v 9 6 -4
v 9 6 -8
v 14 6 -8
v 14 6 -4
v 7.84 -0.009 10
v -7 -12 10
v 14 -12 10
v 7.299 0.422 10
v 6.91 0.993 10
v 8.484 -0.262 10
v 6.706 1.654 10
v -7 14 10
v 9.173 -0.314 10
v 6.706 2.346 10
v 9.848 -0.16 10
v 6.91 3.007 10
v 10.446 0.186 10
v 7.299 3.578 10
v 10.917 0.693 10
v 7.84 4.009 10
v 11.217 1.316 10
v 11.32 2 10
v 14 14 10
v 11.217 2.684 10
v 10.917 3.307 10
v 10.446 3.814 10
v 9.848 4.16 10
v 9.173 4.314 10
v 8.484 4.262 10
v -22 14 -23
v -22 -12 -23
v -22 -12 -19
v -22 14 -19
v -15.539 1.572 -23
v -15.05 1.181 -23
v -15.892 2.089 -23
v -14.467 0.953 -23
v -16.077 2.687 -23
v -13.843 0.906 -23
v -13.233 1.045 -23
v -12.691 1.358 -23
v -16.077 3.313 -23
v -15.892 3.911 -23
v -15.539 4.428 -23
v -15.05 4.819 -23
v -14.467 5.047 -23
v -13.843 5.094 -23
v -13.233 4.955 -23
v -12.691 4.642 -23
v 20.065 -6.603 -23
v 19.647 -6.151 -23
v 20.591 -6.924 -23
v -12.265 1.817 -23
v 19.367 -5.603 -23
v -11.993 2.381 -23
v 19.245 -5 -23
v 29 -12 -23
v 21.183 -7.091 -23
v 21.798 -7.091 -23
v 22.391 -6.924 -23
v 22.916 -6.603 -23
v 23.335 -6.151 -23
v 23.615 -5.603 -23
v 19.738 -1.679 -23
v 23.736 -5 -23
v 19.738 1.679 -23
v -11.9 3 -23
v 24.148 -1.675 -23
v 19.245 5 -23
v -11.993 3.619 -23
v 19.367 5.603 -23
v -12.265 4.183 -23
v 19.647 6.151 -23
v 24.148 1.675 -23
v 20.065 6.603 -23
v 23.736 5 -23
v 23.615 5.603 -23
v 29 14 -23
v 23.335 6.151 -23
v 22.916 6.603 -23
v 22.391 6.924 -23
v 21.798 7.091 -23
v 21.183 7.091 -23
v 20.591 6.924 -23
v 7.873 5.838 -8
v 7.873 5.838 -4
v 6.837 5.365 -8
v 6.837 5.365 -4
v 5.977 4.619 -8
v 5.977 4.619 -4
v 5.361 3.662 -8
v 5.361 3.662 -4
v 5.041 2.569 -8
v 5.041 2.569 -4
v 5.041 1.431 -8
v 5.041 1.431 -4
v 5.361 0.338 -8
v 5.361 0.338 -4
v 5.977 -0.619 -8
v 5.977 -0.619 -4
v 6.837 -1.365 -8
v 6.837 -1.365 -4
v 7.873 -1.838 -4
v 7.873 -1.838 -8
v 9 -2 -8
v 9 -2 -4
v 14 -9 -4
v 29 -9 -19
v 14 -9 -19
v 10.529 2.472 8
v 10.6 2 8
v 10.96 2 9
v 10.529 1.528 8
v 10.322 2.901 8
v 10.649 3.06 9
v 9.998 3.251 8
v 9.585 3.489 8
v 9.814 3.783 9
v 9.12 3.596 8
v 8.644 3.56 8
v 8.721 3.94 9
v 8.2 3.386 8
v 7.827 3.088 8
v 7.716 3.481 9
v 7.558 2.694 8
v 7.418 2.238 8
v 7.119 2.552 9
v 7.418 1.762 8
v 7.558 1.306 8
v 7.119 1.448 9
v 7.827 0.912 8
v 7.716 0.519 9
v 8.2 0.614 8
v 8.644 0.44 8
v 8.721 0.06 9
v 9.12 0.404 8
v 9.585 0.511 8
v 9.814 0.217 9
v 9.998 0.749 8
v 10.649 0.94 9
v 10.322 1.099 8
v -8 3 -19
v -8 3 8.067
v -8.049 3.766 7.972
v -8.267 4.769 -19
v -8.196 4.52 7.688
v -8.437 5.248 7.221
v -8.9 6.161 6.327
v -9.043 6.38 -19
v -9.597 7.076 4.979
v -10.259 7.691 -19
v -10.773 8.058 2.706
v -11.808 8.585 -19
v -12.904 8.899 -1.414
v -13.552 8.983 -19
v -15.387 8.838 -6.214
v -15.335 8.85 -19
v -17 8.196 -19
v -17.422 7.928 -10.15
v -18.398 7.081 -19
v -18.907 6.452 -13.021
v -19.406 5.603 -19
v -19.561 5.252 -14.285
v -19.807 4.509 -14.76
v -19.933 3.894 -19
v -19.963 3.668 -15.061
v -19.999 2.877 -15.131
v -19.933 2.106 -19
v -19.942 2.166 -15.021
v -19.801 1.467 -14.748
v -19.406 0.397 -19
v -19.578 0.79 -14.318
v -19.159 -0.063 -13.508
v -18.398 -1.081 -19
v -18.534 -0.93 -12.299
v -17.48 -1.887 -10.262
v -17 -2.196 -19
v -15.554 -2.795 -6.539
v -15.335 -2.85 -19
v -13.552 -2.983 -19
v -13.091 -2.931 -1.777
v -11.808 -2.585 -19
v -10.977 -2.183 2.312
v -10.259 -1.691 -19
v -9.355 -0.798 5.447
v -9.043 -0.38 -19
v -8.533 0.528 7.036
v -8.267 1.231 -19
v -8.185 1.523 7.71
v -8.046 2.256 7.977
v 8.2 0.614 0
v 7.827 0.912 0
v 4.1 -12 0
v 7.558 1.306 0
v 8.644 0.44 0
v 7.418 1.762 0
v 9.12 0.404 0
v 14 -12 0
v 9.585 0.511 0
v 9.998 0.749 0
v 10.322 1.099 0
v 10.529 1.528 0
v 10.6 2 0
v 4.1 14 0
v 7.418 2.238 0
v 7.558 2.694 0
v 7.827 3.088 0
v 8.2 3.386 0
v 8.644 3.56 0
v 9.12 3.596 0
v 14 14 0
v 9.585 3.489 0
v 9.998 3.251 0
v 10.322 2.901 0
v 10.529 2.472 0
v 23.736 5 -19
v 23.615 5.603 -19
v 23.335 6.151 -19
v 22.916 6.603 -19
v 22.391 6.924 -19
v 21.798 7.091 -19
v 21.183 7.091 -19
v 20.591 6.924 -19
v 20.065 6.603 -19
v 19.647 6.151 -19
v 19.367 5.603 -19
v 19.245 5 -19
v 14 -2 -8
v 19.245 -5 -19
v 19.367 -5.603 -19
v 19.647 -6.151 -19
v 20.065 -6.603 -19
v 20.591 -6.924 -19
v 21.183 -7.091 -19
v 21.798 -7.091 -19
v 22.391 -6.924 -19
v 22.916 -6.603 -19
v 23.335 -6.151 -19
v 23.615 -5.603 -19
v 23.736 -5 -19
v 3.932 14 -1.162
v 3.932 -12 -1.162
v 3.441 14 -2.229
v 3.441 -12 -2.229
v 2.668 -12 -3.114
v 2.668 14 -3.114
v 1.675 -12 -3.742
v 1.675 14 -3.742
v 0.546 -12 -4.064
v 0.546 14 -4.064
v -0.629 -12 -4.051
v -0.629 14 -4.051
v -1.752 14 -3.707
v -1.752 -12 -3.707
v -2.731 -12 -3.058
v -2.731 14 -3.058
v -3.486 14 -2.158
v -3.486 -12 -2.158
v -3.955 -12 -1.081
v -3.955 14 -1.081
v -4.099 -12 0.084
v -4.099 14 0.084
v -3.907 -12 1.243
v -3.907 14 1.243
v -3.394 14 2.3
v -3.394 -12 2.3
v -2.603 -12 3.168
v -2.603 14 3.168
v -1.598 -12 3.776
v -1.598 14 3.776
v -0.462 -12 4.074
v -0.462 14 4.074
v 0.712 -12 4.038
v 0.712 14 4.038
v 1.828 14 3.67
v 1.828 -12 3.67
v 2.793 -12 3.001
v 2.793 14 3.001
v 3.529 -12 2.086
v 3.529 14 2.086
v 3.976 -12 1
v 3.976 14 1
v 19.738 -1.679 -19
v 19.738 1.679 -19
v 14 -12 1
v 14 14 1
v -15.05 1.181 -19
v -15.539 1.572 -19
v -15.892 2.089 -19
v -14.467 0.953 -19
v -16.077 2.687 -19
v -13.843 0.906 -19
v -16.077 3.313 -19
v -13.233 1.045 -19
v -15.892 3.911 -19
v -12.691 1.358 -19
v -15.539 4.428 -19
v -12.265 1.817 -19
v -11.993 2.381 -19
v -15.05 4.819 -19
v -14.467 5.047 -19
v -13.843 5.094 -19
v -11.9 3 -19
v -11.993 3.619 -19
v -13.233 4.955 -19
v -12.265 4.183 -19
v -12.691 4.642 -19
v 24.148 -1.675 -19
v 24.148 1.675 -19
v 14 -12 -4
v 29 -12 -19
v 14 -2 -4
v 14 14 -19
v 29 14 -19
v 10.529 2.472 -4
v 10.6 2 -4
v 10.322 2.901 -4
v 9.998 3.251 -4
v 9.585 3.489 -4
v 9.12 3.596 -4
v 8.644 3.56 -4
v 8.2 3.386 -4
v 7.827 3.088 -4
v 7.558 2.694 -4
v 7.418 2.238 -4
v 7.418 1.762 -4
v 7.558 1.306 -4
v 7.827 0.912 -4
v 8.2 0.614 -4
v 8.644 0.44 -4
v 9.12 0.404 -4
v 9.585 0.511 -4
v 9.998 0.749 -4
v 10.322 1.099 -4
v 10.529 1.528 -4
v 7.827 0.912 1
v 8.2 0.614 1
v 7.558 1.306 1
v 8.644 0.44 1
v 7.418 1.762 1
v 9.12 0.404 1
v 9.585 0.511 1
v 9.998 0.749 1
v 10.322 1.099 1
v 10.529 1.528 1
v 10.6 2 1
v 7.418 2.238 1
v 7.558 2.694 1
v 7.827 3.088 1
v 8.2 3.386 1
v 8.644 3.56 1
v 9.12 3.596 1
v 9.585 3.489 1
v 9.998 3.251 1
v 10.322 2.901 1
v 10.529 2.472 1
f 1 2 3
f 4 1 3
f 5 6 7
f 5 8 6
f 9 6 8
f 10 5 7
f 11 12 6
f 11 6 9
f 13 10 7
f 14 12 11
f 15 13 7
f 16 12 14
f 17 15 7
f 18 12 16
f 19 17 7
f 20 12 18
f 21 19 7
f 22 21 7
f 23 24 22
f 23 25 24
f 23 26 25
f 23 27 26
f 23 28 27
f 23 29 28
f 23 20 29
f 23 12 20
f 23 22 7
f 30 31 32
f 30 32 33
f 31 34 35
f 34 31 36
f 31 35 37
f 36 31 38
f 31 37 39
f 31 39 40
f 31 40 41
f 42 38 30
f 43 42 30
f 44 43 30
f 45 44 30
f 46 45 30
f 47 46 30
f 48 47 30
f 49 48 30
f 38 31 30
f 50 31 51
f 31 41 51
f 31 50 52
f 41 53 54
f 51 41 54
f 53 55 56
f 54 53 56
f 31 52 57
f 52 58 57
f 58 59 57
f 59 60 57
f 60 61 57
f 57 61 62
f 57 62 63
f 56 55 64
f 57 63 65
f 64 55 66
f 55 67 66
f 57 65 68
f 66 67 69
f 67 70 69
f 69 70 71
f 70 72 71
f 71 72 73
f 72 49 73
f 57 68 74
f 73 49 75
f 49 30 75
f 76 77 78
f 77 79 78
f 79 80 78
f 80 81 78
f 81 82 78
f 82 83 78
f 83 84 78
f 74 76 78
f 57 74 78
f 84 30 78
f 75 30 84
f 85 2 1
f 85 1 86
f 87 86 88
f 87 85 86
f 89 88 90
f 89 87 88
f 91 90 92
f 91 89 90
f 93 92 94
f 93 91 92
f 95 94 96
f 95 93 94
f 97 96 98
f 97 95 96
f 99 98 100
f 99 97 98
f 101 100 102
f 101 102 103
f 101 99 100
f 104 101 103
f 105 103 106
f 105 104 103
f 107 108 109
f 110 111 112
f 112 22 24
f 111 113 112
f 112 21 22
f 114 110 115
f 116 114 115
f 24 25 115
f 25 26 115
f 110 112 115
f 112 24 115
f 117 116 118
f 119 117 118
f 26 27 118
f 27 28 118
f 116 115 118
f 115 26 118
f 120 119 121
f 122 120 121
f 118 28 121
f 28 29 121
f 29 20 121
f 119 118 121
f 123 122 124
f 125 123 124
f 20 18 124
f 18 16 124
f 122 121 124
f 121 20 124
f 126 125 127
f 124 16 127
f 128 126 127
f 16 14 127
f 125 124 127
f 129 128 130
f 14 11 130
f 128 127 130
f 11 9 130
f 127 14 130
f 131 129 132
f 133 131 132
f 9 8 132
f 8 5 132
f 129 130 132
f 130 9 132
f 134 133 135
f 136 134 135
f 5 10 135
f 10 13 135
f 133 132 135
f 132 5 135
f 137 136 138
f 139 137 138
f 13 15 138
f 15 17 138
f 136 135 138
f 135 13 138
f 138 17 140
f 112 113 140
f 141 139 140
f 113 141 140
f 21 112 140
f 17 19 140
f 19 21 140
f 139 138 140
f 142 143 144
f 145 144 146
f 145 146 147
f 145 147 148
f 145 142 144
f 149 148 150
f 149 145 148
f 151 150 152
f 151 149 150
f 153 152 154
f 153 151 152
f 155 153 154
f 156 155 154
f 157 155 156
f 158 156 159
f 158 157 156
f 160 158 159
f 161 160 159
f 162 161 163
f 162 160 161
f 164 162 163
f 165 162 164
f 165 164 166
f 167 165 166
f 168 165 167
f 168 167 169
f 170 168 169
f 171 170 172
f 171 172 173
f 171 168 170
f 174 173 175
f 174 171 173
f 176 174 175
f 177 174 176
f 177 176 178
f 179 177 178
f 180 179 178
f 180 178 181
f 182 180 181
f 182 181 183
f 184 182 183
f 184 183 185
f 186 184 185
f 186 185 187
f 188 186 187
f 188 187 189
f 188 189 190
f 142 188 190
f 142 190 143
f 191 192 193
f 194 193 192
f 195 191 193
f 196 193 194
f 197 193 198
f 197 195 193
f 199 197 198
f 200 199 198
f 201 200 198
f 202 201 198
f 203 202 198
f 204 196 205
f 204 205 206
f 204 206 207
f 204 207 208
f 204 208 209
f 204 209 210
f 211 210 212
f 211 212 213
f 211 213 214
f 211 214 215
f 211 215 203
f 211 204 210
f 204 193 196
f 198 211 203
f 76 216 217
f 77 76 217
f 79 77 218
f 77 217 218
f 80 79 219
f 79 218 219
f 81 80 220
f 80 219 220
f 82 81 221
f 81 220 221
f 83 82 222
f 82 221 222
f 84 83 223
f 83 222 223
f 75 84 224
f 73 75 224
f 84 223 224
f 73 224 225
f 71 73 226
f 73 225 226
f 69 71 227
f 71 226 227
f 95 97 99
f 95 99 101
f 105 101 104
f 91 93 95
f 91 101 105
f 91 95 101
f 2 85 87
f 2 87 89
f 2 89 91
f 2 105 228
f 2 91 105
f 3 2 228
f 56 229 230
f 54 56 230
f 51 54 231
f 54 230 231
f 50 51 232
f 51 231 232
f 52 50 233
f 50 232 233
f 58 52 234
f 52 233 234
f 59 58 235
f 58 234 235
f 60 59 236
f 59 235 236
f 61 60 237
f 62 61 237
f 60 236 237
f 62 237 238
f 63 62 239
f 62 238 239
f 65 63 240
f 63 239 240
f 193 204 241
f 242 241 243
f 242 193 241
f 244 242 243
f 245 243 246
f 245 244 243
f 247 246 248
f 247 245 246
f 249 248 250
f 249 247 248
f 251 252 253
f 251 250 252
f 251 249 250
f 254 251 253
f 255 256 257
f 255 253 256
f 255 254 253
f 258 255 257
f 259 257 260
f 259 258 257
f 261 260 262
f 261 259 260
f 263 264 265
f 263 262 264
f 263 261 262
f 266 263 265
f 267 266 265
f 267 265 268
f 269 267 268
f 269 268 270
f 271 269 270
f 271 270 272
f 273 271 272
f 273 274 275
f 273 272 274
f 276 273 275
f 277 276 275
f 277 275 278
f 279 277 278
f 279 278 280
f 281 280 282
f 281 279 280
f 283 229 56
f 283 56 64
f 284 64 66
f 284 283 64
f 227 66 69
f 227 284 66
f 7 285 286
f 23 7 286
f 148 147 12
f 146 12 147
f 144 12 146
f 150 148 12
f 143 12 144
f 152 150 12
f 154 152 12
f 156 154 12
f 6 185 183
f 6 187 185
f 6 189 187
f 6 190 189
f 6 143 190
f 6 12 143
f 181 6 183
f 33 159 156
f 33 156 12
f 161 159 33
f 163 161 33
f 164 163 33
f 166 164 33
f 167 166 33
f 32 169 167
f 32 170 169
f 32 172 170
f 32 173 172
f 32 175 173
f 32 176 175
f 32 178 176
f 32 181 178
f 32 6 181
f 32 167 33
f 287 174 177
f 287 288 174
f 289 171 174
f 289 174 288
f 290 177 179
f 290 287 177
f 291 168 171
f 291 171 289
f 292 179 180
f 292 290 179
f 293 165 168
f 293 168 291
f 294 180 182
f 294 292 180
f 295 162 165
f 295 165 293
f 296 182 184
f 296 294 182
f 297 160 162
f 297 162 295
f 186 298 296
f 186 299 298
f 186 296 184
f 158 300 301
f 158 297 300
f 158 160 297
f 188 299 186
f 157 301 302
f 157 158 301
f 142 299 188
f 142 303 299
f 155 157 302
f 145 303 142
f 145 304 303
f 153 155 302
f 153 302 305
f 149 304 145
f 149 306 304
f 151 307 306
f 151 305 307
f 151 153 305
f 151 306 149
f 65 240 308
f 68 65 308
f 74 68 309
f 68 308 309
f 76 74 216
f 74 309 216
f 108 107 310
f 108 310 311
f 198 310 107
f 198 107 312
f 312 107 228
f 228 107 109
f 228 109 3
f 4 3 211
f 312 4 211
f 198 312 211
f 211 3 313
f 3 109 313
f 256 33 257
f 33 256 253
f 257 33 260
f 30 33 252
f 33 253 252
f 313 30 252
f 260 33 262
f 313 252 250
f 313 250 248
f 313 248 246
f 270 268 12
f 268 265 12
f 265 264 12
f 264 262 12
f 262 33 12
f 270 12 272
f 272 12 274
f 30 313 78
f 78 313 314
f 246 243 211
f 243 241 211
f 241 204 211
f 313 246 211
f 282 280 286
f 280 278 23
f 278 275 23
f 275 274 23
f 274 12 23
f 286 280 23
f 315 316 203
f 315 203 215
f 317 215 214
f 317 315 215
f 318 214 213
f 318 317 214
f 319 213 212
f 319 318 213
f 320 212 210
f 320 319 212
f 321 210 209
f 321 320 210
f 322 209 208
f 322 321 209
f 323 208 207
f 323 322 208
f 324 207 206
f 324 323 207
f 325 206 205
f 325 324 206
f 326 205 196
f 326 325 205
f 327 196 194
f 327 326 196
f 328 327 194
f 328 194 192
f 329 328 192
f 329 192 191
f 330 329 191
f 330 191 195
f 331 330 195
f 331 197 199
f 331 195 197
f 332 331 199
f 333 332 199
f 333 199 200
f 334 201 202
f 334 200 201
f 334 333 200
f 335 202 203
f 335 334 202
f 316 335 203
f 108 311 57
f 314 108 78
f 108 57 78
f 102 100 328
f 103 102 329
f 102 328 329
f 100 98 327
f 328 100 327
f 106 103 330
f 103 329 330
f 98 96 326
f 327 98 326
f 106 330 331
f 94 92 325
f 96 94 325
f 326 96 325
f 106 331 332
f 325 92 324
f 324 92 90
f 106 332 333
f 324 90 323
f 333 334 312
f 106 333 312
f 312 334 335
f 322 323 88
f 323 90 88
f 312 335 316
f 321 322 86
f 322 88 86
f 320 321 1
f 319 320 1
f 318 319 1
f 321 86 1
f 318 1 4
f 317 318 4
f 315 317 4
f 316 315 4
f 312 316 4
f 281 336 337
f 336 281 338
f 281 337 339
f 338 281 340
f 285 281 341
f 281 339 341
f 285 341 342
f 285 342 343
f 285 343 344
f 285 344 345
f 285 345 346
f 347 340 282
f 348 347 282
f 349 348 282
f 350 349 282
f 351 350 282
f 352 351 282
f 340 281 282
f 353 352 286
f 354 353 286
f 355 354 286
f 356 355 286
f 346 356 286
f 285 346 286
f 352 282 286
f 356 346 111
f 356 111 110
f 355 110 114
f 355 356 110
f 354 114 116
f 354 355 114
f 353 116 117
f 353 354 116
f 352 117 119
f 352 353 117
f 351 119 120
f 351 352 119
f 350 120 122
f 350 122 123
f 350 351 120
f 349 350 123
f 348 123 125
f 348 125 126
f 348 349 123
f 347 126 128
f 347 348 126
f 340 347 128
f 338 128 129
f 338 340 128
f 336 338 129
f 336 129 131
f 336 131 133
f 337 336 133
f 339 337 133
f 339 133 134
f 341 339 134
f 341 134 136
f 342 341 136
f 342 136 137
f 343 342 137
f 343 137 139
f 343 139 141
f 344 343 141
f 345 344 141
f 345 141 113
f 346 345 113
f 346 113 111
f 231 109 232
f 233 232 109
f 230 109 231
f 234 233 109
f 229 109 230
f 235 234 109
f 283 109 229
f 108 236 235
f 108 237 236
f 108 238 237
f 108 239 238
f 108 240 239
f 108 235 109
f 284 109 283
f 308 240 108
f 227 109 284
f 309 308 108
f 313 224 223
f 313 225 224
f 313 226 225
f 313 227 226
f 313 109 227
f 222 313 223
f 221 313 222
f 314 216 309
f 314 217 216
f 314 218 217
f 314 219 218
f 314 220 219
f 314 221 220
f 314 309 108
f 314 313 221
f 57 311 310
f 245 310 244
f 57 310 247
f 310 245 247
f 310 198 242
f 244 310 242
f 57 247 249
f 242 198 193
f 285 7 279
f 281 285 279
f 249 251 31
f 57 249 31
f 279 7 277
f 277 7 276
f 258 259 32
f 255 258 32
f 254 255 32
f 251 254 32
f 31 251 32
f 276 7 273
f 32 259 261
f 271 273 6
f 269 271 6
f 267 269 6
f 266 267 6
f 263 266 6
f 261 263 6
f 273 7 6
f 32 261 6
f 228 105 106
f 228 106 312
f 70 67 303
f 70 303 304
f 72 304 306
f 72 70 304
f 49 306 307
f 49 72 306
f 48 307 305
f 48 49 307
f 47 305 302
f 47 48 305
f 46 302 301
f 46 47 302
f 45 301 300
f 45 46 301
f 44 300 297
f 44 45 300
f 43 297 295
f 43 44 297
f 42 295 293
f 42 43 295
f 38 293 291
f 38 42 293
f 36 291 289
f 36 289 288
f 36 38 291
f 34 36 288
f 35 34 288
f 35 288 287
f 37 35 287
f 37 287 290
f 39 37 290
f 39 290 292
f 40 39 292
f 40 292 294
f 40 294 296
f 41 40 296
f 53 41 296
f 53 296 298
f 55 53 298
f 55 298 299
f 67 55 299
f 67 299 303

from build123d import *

# Parameters (mm, degrees)
CYLINDER072_R              = 6
CYLINDER072_DEPTH          = 30
CYLINDER071_R              = 2.1
CYLINDER071_DEPTH          = 10
CYLINDER074_R              = 1.6
CYLINDER074_DEPTH          = 15
CYLINDER075_R              = 4
CYLINDER075_DEPTH          = 4
BOX025_W                   = 13
BOX025_H                   = 8
BOX025_DEPTH               = 4
EXTRUDE005_DEPTH           = 3
EXTRUDE005_PLACEMENT_ANGLE = 180
EXTRUDE018_DEPTH           = 10
BOX023_W                   = 51
BOX023_H                   = 26
BOX023_DEPTH               = 4
EXTRUDE017_DEPTH           = 26
CYLINDER073_R              = 4.1
CYLINDER073_DEPTH          = 240
BOX024_W                   = 12
BOX024_H                   = 35
BOX024_DEPTH               = 1
BOX022_W                   = 21
BOX022_H                   = 26
BOX022_DEPTH               = 33


with BuildPart() as cylinder072:
    # Cylinder072 → Cylinder072 (new body)
    with BuildSketch(Plane.XY.offset(10)):
        Circle(CYLINDER072_R)
    extrude(amount=CYLINDER072_DEPTH)


with BuildPart() as fusion032:
    # Cylinder071 → Cylinder071 (new body)
    with BuildSketch(Plane.XY):
        Circle(CYLINDER071_R)
    extrude(amount=CYLINDER071_DEPTH)

    # Fusion032: union Cylinder072
    add(cylinder072.part)


with BuildPart() as fusion032_1:
    # Fusion032 placement: moved
    add(fusion032.part.moved(Location((-14, 12, -29))))


with BuildPart() as cylinder074:
    # Cylinder074 → Cylinder074 (new body)
    with BuildSketch(Plane.XY):
        Circle(CYLINDER074_R)
    extrude(amount=CYLINDER074_DEPTH)


with BuildPart() as fusion009:
    # Cone → Cone (revolve)
    with BuildSketch(Plane(origin=(0, 0, 15), x_dir=(1, 0, 0), z_dir=(0, -1, 0))):
        Polygon((0, 0), (1.6, 0), (2.5, 2.5), (0, 2.5), align=None)
    revolve(axis=Axis((0, 0, 15), (0, 0, 1)))

    # Fusion009: union Cylinder074
    add(cylinder074.part)


with BuildPart() as fusion009_1:
    # Fusion009 placement: moved
    add(fusion009.part.moved(Location((9, 11, -7))))


with BuildPart() as cylinder075:
    # Cylinder075 → Cylinder075 (new body)
    with BuildSketch(Plane(origin=(9, 11, -8), x_dir=(1, 0, 0), z_dir=(0, 0, 1))):
        Circle(CYLINDER075_R)
    extrude(amount=CYLINDER075_DEPTH)


with BuildPart() as fusion010:
    # Box025 → Box025 (new body)
    with BuildSketch(Plane(origin=(9, 7, -8), x_dir=(1, 0, 0), z_dir=(0, 0, 1))):
        with Locations((6.5, 4)):
            Rectangle(BOX025_W, BOX025_H)
    extrude(amount=BOX025_DEPTH)

    # Fusion010: union Cylinder075
    add(cylinder075.part)


with BuildPart() as extrude005:
    # Sketch004 → Extrude005 (new body)
    with BuildSketch(Plane.XZ):
        Polygon((-22, -19), (-7, -19), (-7, -4), align=None)
    extrude(amount=-EXTRUDE005_DEPTH)


with BuildPart() as extrude005_1:
    # Extrude005 placement: moved
    add(extrude005.part.moved(Location((7, 0, 0))).rotate(Axis((7, 0, 0), (0, 0, 1)), EXTRUDE005_PLACEMENT_ANGLE))


with BuildPart() as extrude018:
    # Sketch003 → Extrude018 (new body)
    with BuildSketch(Plane.XY):
        with BuildLine():
            ThreePointArc((35.736492, 10), (36.2, 15), (35.736492, 20))
            ThreePointArc((35.736492, 20), (33.490746, 22.111711), (31.244999, 20))
            ThreePointArc((31.244999, 10), (31.8, 15), (31.244999, 20))
            ThreePointArc((31.244999, 10), (33.490746, 7.888289), (35.736492, 10))
        make_face()
    extrude(amount=-EXTRUDE018_DEPTH)


with BuildPart() as extrude018_1:
    # Extrude018 placement: moved
    add(extrude018.part.moved(Location((-12, -3, -17))))


with BuildPart() as cut017:
    # Box023 → Box023 (new body)
    with BuildSketch(Plane(origin=(-22, 0, -23), x_dir=(1, 0, 0), z_dir=(0, 0, 1))):
        with Locations((25.5, 13)):
            Rectangle(BOX023_W, BOX023_H)
    extrude(amount=BOX023_DEPTH)

    # Cut017: cut Extrude018
    add(extrude018_1.part, mode=Mode.SUBTRACT)


with BuildPart() as cut017_1:
    # Cut017 placement: moved
    add(cut017.part.moved(Location((0, -3, 0))))


with BuildPart() as extrude017:
    # Sketch016 → Extrude017 (new body)
    with BuildSketch(Plane.XZ):
        Polygon((-22, -19), (-7, -19), (-7, 10), align=None)
    extrude(amount=-EXTRUDE017_DEPTH)


with BuildPart() as extrude017_1:
    # Extrude017 placement: moved
    add(extrude017.part.moved(Location((0, -3, 0))))


with BuildPart() as cylinder073:
    # Cylinder073 → Cylinder073 (new body)
    with BuildSketch(Plane(origin=(0, -7, 0), x_dir=(1, 0, 0), z_dir=(0, 1, 0))):
        Circle(CYLINDER073_R)
    extrude(amount=CYLINDER073_DEPTH)


with BuildPart() as box024:
    # Box024 → Box024 (new body)
    with BuildSketch(Plane(origin=(3, -6, 0), x_dir=(1, 0, 0), z_dir=(0, 0, 1))):
        with Locations((6, 17.5)):
            Rectangle(BOX024_W, BOX024_H)
    extrude(amount=BOX024_DEPTH)


with BuildPart() as cut022:
    # Box022 → Box022 (new body)
    with BuildSketch(Plane(origin=(-7, -3, -23), x_dir=(1, 0, 0), z_dir=(0, 0, 1))):
        with Locations((10.5, 13)):
            Rectangle(BOX022_W, BOX022_H)
    extrude(amount=BOX022_DEPTH)

    # Cut018: cut Box024
    add(box024.part, mode=Mode.SUBTRACT)

    # Cut019: cut Cylinder073
    add(cylinder073.part, mode=Mode.SUBTRACT)

    # Fusion031: union Cut017, Extrude017
    add(cut017_1.part)
    add(extrude017_1.part)

    # Fusion011: union Extrude005
    add(extrude005_1.part)

    # Cut020: cut Fusion010
    add(fusion010.part, mode=Mode.SUBTRACT)

    # Cut021: cut Fusion009
    add(fusion009_1.part, mode=Mode.SUBTRACT)

    # Cut022: cut Fusion032
    add(fusion032_1.part, mode=Mode.SUBTRACT)


with BuildPart() as cut022_1:
    # Cut022 placement: moved
    add(cut022.part.moved(Location((0, -9, 0))))


solid = cut022_1.part
